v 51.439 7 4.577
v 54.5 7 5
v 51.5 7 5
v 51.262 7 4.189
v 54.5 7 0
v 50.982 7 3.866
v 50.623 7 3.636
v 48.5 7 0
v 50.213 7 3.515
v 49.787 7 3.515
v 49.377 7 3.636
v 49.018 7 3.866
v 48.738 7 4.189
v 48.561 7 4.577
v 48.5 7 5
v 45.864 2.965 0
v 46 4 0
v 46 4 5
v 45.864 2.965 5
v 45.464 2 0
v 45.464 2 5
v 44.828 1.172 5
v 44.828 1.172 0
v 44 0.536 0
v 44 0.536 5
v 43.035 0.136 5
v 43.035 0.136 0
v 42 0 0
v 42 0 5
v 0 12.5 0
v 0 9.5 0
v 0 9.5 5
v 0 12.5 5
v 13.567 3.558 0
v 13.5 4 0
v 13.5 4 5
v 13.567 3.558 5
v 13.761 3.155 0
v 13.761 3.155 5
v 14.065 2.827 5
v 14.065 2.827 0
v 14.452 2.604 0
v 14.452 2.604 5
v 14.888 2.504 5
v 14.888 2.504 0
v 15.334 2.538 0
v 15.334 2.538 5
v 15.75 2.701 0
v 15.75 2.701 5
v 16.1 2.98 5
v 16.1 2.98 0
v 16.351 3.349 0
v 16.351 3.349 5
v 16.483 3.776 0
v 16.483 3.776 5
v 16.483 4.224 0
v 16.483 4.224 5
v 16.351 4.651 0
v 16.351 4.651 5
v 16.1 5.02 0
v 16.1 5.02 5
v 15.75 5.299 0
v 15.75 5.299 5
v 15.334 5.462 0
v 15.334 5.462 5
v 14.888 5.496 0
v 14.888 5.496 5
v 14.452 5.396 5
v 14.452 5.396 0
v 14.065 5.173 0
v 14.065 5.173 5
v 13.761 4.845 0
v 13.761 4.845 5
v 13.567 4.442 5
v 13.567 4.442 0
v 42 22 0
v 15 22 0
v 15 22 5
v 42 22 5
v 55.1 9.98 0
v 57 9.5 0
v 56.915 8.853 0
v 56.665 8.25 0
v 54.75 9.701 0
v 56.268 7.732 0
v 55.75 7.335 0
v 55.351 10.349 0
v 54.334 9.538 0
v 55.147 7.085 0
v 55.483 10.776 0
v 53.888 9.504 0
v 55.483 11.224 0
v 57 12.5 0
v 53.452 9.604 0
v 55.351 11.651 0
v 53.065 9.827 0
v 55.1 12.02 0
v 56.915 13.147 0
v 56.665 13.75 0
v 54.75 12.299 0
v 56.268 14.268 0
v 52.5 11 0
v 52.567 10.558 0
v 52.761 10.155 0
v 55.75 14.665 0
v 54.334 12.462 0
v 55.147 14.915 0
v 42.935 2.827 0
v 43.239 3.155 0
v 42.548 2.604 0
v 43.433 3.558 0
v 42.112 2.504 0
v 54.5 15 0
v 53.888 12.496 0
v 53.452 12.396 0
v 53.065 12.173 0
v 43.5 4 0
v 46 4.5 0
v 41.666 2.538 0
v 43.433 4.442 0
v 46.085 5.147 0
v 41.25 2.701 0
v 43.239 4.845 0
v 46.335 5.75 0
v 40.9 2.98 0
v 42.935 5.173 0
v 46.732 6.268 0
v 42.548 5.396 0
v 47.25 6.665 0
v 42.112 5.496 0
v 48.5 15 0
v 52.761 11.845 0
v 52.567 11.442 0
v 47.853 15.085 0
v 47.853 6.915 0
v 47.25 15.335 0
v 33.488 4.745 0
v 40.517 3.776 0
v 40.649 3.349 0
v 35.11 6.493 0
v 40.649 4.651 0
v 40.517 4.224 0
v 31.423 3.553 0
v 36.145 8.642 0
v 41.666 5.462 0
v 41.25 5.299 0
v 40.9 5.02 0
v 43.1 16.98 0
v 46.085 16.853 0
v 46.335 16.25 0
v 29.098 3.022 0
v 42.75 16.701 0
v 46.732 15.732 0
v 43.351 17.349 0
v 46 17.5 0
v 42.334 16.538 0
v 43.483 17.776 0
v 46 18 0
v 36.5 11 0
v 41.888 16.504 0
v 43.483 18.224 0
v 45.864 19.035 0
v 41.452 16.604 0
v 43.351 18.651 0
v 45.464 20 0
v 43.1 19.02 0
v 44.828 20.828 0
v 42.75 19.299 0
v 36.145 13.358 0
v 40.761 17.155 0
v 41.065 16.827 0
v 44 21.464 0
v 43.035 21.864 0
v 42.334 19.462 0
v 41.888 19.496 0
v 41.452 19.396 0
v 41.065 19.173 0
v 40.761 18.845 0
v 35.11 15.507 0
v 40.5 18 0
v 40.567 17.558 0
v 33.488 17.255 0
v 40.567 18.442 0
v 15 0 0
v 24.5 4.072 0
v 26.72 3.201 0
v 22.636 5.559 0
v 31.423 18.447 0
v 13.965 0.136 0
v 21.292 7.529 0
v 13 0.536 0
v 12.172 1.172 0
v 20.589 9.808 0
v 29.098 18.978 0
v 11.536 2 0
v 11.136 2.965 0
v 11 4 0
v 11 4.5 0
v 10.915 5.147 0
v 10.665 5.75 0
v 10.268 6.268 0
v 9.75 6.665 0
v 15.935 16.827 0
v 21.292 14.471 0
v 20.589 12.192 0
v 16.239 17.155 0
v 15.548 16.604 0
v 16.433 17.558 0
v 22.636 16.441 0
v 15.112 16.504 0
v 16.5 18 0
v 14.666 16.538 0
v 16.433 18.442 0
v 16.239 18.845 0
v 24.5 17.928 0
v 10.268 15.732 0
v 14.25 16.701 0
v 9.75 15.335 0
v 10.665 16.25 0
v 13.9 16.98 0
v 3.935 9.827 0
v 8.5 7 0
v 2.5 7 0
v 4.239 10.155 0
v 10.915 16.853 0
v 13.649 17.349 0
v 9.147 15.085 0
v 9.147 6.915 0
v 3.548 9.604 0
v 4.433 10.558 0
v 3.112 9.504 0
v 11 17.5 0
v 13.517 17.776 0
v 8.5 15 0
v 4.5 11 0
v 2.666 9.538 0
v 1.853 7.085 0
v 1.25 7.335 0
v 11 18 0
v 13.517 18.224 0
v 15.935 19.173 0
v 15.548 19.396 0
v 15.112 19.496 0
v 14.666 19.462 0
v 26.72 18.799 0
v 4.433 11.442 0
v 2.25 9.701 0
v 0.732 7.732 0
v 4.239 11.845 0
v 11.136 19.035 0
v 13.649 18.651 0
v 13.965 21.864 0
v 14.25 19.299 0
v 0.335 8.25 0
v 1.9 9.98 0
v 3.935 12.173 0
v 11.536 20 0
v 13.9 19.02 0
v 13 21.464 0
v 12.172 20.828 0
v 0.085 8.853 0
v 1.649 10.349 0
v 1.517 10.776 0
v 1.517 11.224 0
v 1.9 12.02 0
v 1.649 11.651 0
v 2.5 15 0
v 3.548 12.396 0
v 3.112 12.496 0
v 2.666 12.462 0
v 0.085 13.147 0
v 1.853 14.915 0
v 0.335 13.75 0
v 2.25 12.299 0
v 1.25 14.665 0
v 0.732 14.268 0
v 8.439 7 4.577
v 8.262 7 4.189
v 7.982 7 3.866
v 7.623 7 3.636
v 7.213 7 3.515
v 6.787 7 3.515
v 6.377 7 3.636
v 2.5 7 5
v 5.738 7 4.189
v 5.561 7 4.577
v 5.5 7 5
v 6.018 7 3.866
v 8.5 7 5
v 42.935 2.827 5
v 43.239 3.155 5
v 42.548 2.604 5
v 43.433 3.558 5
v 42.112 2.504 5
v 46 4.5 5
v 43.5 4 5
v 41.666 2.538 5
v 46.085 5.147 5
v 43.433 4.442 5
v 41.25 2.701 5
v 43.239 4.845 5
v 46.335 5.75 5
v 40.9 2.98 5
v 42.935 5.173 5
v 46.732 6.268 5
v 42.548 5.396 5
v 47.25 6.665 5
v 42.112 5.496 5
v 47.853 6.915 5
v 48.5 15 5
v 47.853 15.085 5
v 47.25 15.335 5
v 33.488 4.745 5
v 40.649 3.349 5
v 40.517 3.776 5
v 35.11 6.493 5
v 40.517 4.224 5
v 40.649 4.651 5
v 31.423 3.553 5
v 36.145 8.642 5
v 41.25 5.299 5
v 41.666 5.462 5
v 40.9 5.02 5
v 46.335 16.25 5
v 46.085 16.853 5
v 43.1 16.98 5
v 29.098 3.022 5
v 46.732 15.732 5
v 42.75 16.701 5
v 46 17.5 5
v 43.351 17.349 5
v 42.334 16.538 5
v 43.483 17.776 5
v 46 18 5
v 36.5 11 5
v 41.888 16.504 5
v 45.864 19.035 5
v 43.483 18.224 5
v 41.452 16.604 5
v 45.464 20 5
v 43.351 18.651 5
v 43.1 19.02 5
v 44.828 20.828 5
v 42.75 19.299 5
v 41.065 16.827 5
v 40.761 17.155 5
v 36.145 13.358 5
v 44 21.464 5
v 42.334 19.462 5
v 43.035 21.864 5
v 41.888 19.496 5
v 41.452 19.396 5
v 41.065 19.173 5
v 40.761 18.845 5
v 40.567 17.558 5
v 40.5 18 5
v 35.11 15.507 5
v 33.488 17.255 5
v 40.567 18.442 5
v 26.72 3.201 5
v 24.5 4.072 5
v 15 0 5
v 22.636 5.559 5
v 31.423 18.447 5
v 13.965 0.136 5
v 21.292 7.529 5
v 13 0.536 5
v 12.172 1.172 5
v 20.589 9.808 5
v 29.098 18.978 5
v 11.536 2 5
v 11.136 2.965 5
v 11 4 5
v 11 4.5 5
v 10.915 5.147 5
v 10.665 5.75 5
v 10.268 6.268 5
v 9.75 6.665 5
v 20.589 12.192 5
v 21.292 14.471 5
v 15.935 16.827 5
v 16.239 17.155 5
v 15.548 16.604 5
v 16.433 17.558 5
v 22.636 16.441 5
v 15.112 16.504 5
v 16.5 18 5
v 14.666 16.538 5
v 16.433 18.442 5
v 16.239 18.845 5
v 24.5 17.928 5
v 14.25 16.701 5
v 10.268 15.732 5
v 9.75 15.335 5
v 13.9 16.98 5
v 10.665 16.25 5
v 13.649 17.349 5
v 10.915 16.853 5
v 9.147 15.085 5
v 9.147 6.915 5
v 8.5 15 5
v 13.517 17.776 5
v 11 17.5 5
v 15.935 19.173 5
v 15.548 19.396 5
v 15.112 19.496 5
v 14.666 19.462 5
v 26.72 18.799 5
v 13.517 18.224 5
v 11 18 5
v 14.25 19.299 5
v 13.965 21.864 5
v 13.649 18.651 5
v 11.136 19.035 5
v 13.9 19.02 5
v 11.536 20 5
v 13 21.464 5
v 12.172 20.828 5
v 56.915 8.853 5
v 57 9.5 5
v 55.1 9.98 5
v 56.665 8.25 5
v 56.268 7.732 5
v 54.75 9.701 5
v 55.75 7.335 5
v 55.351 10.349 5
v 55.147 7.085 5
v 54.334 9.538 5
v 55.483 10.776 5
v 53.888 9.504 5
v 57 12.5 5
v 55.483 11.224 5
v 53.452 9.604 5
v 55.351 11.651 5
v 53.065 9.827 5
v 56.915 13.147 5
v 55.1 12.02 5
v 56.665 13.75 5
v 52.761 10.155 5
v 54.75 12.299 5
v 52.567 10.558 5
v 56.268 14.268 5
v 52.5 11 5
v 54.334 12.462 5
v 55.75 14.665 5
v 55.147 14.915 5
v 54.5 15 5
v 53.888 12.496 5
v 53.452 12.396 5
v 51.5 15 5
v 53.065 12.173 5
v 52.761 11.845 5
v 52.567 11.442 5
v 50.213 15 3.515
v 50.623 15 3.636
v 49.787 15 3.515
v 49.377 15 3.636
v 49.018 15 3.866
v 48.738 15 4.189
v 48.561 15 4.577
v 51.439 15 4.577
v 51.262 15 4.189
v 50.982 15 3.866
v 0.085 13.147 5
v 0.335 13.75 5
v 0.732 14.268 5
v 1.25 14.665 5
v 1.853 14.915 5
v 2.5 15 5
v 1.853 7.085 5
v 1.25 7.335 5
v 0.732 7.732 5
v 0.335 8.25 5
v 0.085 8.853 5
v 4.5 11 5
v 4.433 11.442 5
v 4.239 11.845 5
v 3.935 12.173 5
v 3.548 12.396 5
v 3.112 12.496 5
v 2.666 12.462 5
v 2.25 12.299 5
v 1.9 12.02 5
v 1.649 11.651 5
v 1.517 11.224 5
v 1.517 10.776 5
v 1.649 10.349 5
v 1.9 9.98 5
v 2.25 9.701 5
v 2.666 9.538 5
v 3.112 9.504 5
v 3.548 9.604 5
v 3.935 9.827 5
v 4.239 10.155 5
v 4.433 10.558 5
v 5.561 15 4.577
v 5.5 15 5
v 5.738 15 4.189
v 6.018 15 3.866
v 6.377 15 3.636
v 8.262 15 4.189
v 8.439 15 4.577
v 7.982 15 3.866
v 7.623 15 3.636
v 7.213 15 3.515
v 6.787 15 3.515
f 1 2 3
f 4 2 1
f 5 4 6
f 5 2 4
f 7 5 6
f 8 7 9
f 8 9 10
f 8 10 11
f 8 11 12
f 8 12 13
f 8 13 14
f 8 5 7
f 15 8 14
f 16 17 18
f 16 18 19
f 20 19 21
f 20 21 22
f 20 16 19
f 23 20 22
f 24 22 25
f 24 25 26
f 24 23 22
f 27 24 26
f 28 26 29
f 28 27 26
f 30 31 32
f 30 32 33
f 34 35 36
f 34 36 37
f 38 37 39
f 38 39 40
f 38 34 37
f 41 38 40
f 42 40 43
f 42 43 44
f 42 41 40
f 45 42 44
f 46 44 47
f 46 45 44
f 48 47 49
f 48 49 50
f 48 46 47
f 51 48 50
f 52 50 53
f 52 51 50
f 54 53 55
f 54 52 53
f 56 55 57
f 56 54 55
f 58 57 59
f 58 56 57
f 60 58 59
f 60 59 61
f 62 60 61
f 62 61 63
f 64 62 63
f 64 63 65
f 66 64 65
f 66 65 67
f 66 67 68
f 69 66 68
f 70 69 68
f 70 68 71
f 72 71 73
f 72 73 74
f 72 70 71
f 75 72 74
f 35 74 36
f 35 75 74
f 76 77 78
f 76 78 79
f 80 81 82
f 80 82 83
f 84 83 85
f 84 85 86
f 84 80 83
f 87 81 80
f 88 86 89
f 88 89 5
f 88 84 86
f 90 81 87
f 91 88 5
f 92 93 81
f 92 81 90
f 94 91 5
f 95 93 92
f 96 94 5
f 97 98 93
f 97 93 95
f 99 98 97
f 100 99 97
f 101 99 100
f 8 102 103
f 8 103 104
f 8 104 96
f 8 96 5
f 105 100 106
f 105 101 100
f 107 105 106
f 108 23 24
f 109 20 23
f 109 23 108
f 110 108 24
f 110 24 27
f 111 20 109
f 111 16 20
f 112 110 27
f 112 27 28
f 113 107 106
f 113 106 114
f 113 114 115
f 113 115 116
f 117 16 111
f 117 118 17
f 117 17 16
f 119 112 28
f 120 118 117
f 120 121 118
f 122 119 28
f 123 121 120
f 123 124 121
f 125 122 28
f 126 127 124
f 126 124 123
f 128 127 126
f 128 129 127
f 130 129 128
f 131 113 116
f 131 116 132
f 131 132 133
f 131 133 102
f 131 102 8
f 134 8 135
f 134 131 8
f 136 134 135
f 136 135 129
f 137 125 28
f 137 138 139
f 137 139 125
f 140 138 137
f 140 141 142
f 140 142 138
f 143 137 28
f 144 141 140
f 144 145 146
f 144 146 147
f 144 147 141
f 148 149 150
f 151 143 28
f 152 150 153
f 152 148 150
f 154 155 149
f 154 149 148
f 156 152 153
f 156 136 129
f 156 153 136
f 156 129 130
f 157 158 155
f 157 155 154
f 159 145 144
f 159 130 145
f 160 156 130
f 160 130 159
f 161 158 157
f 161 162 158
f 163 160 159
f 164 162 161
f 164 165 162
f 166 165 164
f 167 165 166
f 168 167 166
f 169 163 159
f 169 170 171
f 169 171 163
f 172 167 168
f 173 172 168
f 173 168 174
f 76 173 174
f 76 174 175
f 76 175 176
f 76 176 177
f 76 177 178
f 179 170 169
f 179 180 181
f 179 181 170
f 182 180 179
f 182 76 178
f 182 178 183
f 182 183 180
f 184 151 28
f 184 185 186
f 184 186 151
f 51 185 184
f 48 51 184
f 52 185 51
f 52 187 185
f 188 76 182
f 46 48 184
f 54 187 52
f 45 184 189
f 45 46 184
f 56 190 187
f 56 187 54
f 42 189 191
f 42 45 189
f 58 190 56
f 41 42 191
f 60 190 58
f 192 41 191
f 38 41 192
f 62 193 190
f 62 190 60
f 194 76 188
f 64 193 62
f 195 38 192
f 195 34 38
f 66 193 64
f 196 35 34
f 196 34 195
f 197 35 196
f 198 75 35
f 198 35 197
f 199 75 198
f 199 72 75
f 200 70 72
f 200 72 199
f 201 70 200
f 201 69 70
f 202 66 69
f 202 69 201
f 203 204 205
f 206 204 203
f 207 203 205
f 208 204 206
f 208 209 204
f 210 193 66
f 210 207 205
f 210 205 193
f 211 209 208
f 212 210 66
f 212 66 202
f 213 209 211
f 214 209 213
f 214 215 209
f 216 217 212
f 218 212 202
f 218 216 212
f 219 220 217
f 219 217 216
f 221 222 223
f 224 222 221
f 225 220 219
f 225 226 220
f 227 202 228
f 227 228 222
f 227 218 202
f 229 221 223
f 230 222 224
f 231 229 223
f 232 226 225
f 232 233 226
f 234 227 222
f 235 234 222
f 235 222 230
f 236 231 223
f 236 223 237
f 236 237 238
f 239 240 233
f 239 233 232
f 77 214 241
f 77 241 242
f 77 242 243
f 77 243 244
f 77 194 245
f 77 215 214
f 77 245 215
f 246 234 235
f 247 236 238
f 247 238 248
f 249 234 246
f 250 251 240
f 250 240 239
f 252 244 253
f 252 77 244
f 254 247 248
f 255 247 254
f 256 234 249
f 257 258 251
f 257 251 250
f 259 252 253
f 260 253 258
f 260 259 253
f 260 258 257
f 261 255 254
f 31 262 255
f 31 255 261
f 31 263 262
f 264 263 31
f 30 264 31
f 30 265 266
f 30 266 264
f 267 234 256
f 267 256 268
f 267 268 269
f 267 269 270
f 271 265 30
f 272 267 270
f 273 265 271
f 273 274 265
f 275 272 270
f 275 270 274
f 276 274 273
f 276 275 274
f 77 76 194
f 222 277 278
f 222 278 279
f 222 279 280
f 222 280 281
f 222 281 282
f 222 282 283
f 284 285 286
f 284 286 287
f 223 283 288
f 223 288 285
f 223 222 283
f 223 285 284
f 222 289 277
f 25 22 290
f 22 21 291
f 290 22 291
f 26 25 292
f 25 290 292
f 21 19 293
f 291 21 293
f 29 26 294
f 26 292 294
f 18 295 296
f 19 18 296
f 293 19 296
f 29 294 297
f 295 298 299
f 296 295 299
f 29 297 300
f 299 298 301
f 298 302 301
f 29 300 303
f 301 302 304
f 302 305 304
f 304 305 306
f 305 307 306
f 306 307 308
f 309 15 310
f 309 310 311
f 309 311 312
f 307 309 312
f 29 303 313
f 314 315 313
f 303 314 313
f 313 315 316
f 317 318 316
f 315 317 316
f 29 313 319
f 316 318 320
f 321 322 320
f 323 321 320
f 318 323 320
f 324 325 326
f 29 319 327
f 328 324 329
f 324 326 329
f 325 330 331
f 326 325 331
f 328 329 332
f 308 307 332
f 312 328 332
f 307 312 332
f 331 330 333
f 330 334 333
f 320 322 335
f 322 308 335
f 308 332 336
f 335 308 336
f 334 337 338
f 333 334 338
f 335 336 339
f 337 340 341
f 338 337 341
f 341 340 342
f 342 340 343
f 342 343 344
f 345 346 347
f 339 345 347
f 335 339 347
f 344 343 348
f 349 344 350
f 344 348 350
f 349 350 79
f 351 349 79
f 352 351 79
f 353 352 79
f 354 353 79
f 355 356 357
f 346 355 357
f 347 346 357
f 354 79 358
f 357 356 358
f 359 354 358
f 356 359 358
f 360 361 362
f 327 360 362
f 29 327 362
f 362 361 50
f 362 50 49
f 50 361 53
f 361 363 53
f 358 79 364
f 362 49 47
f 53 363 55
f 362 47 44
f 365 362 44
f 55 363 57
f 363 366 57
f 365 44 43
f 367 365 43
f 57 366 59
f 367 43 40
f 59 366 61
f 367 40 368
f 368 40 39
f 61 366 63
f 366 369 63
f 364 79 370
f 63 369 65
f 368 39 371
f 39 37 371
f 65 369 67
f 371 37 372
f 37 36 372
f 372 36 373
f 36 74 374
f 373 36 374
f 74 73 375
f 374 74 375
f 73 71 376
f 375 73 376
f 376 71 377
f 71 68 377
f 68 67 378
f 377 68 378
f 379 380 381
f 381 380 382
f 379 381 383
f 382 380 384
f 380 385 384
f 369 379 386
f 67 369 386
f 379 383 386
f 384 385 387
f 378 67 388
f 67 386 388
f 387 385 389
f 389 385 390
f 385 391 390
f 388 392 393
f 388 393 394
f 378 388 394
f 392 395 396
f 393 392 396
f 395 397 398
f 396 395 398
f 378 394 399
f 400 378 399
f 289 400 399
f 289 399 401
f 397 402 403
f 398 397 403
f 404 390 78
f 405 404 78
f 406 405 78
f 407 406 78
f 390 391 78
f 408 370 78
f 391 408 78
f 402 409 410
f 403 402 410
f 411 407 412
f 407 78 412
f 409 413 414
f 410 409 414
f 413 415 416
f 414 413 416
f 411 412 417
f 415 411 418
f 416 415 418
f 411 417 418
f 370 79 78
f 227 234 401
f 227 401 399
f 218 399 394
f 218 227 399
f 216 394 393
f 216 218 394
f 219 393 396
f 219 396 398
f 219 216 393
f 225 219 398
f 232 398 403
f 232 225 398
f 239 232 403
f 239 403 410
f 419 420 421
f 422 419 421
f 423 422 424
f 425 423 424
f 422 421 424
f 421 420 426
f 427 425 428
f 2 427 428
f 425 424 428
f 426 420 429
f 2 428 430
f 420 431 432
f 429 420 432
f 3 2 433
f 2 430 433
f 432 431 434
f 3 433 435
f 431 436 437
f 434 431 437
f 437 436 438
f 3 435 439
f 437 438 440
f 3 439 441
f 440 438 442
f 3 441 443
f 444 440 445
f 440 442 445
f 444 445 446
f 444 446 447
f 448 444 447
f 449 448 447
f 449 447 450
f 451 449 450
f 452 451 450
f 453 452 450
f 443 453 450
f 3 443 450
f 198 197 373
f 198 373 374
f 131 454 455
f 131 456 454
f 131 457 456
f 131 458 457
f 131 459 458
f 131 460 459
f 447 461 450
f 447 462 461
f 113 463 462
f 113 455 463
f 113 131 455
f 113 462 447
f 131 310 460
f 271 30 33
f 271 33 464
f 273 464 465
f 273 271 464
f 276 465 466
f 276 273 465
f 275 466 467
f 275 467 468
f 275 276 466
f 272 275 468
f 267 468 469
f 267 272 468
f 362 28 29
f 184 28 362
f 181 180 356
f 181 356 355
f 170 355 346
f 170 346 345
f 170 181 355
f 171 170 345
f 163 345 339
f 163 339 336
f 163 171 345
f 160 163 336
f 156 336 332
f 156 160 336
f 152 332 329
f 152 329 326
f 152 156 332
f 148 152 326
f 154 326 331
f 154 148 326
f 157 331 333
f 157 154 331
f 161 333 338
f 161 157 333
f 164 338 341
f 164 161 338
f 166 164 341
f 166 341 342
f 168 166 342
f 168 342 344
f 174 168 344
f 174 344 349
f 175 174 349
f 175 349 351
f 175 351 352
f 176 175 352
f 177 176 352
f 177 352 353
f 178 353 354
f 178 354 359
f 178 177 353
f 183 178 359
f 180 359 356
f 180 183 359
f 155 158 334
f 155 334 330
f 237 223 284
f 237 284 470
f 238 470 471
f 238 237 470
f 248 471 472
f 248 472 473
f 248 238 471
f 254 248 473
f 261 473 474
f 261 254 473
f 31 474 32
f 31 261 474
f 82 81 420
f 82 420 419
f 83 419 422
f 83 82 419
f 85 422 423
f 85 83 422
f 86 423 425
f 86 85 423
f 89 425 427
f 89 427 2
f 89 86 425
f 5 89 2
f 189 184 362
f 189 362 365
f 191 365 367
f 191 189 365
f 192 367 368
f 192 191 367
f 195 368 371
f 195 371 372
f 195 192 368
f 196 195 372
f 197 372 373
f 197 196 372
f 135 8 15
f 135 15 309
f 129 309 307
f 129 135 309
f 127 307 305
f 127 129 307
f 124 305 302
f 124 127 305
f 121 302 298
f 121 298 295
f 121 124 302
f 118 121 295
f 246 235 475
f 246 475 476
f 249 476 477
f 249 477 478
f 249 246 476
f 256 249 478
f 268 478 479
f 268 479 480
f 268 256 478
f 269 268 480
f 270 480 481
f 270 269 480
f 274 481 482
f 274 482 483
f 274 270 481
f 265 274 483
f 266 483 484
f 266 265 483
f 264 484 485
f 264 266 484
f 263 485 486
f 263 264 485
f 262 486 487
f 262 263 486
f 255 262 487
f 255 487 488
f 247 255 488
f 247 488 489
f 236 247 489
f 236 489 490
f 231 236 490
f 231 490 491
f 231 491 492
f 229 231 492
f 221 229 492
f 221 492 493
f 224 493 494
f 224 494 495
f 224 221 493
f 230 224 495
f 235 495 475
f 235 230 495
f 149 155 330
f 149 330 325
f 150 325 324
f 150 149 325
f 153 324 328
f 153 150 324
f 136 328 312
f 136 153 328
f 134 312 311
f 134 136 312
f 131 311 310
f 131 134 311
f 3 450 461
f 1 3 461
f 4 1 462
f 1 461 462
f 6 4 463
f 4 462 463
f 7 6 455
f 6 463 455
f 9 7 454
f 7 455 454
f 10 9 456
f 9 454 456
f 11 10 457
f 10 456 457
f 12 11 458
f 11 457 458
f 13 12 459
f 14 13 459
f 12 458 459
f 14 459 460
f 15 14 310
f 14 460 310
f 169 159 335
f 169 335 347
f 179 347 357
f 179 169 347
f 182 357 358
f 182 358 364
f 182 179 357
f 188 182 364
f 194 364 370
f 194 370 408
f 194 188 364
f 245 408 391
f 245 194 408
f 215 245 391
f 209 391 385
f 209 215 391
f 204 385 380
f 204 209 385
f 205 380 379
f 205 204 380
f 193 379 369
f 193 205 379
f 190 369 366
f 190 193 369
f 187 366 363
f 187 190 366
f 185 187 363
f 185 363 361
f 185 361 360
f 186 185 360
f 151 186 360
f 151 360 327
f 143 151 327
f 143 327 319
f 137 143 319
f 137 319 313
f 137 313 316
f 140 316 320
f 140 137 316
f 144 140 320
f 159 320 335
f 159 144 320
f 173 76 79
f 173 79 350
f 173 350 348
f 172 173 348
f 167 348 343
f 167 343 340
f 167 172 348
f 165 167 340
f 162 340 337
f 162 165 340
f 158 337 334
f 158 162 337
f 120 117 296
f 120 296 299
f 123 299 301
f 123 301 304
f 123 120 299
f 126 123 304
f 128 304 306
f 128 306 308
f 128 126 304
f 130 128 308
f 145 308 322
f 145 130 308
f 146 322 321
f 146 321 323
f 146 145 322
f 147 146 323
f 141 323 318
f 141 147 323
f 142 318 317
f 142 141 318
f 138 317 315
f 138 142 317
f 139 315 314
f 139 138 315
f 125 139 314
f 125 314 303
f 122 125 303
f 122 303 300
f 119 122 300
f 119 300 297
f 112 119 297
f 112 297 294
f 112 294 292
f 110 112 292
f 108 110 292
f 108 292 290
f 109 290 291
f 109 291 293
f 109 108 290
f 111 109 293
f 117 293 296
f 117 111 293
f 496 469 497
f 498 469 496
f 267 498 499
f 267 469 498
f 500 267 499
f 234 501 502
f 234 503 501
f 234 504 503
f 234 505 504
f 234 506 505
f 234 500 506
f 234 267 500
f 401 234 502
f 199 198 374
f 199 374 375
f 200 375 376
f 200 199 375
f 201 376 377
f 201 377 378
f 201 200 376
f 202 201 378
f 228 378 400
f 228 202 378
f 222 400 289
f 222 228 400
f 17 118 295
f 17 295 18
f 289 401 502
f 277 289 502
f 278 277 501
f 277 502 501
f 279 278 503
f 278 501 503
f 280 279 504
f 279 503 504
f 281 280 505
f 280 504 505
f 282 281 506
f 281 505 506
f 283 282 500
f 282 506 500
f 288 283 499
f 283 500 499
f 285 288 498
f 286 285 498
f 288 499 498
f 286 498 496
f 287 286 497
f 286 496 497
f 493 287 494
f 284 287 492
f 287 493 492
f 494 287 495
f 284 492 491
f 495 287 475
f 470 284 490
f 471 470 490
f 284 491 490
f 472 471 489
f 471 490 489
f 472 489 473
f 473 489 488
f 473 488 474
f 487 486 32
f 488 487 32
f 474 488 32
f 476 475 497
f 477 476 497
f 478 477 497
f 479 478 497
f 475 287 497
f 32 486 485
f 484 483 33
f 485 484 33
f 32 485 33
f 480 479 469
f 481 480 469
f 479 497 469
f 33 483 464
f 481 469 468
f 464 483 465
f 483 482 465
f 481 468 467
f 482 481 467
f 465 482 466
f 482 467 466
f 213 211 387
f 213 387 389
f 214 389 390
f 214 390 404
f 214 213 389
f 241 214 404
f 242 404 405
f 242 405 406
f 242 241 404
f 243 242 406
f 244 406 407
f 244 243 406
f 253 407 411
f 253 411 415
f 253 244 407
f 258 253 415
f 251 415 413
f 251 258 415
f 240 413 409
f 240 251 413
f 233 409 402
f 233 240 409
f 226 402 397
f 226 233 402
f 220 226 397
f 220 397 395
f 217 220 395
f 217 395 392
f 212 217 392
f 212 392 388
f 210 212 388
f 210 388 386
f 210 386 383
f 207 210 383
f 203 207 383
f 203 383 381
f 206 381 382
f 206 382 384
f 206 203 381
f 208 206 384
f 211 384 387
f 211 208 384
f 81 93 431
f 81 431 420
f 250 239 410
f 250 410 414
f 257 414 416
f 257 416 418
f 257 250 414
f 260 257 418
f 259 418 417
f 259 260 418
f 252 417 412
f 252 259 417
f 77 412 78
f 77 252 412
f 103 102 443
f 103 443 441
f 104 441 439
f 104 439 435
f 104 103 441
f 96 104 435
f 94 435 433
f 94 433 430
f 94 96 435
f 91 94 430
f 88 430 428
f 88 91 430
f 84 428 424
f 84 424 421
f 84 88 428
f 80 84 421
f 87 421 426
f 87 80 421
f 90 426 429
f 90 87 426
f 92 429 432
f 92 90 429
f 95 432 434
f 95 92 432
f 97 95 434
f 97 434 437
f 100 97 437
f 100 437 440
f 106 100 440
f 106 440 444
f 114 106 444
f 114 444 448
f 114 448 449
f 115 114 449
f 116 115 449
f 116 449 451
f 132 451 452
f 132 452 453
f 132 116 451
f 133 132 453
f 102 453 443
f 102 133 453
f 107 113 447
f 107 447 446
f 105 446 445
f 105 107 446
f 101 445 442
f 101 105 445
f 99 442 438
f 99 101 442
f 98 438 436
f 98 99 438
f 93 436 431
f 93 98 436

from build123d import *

# Parameters (mm, degrees)
SKETCH_1_R          = 8
SKETCH_1_R_2        = 1.5
EXTRUDE_1_DEPTH     = 5
SKETCH_2_R          = 1.5
CUT_EXTRUDE_1_DEPTH = 11.5


with BuildPart() as part:
    # 草图1 → 凸台-拉伸1 (new body)
    with BuildSketch(Plane.XY):
        with BuildLine():
            Line((2.5, 15), (8.5, 15))
            ThreePointArc((8.5, 15), (10.267766953, 15.732233047), (11, 17.5))
            Line((11, 17.5), (11, 18))
            ThreePointArc((11, 18), (12.171572875, 20.828427125), (15, 22))
            Line((15, 22), (42, 22))
            ThreePointArc((42, 22), (44.828427125, 20.828427125), (46, 18))
            Line((46, 18), (46, 17.5))
            ThreePointArc((46, 17.5), (46.732233047, 15.732233047), (48.5, 15))
            Line((48.5, 15), (54.5, 15))
            ThreePointArc((54.5, 15), (56.267766953, 14.267766953), (57, 12.5))
            Line((57, 12.5), (57, 9.5))
            ThreePointArc((57, 9.5), (56.267766953, 7.732233047), (54.5, 7))
            Line((54.5, 7), (48.5, 7))
            ThreePointArc((48.5, 7), (46.732233047, 6.267766953), (46, 4.5))
            Line((46, 4.5), (46, 4))
            ThreePointArc((46, 4), (44.828427125, 1.171572875), (42, 0))
            Line((42, 0), (15, 0))
            ThreePointArc((15, 0), (12.171572875, 1.171572875), (11, 4))
            Line((11, 4), (11, 4.5))
            ThreePointArc((11, 4.5), (10.267766953, 6.267766953), (8.5, 7))
            Line((8.5, 7), (2.5, 7))
            ThreePointArc((2.5, 7), (0.732233047, 7.732233047), (0, 9.5))
            Line((0, 9.5), (0, 12.5))
            ThreePointArc((0, 12.5), (0.732233047, 14.267766953), (2.5, 15))
        make_face()
        with Locations((28.5, 11)):
            Circle(SKETCH_1_R, mode=Mode.SUBTRACT)
        with Locations((15, 18)):
            Circle(SKETCH_1_R_2, mode=Mode.SUBTRACT)
        with Locations(Location((15, 4, 0), (0, 0, 180))):
            Circle(SKETCH_1_R_2, mode=Mode.SUBTRACT)
        with Locations(Location((42, 18, 0), (0, 0, 180))):
            Circle(SKETCH_1_R_2, mode=Mode.SUBTRACT)
        with Locations((42, 4)):
            Circle(SKETCH_1_R_2, mode=Mode.SUBTRACT)
        with Locations((3, 11)):
            Circle(SKETCH_1_R_2, mode=Mode.SUBTRACT)
        with Locations(Location((54, 11, 0), (0, 0, 180))):
            Circle(SKETCH_1_R_2, mode=Mode.SUBTRACT)
    extrude(amount=EXTRUDE_1_DEPTH)

    # 草图2 → 切除-拉伸1 (cut)
    with BuildSketch(Plane(origin=(0, 15, 0), x_dir=(1, 0, 0), z_dir=(0, 1, 0))):
        with Locations((7, -5)):
            Circle(SKETCH_2_R)
        with Locations((50, -5)):
            Circle(SKETCH_2_R)
    extrude(amount=-CUT_EXTRUDE_1_DEPTH, mode=Mode.SUBTRACT)


solid = part.part
